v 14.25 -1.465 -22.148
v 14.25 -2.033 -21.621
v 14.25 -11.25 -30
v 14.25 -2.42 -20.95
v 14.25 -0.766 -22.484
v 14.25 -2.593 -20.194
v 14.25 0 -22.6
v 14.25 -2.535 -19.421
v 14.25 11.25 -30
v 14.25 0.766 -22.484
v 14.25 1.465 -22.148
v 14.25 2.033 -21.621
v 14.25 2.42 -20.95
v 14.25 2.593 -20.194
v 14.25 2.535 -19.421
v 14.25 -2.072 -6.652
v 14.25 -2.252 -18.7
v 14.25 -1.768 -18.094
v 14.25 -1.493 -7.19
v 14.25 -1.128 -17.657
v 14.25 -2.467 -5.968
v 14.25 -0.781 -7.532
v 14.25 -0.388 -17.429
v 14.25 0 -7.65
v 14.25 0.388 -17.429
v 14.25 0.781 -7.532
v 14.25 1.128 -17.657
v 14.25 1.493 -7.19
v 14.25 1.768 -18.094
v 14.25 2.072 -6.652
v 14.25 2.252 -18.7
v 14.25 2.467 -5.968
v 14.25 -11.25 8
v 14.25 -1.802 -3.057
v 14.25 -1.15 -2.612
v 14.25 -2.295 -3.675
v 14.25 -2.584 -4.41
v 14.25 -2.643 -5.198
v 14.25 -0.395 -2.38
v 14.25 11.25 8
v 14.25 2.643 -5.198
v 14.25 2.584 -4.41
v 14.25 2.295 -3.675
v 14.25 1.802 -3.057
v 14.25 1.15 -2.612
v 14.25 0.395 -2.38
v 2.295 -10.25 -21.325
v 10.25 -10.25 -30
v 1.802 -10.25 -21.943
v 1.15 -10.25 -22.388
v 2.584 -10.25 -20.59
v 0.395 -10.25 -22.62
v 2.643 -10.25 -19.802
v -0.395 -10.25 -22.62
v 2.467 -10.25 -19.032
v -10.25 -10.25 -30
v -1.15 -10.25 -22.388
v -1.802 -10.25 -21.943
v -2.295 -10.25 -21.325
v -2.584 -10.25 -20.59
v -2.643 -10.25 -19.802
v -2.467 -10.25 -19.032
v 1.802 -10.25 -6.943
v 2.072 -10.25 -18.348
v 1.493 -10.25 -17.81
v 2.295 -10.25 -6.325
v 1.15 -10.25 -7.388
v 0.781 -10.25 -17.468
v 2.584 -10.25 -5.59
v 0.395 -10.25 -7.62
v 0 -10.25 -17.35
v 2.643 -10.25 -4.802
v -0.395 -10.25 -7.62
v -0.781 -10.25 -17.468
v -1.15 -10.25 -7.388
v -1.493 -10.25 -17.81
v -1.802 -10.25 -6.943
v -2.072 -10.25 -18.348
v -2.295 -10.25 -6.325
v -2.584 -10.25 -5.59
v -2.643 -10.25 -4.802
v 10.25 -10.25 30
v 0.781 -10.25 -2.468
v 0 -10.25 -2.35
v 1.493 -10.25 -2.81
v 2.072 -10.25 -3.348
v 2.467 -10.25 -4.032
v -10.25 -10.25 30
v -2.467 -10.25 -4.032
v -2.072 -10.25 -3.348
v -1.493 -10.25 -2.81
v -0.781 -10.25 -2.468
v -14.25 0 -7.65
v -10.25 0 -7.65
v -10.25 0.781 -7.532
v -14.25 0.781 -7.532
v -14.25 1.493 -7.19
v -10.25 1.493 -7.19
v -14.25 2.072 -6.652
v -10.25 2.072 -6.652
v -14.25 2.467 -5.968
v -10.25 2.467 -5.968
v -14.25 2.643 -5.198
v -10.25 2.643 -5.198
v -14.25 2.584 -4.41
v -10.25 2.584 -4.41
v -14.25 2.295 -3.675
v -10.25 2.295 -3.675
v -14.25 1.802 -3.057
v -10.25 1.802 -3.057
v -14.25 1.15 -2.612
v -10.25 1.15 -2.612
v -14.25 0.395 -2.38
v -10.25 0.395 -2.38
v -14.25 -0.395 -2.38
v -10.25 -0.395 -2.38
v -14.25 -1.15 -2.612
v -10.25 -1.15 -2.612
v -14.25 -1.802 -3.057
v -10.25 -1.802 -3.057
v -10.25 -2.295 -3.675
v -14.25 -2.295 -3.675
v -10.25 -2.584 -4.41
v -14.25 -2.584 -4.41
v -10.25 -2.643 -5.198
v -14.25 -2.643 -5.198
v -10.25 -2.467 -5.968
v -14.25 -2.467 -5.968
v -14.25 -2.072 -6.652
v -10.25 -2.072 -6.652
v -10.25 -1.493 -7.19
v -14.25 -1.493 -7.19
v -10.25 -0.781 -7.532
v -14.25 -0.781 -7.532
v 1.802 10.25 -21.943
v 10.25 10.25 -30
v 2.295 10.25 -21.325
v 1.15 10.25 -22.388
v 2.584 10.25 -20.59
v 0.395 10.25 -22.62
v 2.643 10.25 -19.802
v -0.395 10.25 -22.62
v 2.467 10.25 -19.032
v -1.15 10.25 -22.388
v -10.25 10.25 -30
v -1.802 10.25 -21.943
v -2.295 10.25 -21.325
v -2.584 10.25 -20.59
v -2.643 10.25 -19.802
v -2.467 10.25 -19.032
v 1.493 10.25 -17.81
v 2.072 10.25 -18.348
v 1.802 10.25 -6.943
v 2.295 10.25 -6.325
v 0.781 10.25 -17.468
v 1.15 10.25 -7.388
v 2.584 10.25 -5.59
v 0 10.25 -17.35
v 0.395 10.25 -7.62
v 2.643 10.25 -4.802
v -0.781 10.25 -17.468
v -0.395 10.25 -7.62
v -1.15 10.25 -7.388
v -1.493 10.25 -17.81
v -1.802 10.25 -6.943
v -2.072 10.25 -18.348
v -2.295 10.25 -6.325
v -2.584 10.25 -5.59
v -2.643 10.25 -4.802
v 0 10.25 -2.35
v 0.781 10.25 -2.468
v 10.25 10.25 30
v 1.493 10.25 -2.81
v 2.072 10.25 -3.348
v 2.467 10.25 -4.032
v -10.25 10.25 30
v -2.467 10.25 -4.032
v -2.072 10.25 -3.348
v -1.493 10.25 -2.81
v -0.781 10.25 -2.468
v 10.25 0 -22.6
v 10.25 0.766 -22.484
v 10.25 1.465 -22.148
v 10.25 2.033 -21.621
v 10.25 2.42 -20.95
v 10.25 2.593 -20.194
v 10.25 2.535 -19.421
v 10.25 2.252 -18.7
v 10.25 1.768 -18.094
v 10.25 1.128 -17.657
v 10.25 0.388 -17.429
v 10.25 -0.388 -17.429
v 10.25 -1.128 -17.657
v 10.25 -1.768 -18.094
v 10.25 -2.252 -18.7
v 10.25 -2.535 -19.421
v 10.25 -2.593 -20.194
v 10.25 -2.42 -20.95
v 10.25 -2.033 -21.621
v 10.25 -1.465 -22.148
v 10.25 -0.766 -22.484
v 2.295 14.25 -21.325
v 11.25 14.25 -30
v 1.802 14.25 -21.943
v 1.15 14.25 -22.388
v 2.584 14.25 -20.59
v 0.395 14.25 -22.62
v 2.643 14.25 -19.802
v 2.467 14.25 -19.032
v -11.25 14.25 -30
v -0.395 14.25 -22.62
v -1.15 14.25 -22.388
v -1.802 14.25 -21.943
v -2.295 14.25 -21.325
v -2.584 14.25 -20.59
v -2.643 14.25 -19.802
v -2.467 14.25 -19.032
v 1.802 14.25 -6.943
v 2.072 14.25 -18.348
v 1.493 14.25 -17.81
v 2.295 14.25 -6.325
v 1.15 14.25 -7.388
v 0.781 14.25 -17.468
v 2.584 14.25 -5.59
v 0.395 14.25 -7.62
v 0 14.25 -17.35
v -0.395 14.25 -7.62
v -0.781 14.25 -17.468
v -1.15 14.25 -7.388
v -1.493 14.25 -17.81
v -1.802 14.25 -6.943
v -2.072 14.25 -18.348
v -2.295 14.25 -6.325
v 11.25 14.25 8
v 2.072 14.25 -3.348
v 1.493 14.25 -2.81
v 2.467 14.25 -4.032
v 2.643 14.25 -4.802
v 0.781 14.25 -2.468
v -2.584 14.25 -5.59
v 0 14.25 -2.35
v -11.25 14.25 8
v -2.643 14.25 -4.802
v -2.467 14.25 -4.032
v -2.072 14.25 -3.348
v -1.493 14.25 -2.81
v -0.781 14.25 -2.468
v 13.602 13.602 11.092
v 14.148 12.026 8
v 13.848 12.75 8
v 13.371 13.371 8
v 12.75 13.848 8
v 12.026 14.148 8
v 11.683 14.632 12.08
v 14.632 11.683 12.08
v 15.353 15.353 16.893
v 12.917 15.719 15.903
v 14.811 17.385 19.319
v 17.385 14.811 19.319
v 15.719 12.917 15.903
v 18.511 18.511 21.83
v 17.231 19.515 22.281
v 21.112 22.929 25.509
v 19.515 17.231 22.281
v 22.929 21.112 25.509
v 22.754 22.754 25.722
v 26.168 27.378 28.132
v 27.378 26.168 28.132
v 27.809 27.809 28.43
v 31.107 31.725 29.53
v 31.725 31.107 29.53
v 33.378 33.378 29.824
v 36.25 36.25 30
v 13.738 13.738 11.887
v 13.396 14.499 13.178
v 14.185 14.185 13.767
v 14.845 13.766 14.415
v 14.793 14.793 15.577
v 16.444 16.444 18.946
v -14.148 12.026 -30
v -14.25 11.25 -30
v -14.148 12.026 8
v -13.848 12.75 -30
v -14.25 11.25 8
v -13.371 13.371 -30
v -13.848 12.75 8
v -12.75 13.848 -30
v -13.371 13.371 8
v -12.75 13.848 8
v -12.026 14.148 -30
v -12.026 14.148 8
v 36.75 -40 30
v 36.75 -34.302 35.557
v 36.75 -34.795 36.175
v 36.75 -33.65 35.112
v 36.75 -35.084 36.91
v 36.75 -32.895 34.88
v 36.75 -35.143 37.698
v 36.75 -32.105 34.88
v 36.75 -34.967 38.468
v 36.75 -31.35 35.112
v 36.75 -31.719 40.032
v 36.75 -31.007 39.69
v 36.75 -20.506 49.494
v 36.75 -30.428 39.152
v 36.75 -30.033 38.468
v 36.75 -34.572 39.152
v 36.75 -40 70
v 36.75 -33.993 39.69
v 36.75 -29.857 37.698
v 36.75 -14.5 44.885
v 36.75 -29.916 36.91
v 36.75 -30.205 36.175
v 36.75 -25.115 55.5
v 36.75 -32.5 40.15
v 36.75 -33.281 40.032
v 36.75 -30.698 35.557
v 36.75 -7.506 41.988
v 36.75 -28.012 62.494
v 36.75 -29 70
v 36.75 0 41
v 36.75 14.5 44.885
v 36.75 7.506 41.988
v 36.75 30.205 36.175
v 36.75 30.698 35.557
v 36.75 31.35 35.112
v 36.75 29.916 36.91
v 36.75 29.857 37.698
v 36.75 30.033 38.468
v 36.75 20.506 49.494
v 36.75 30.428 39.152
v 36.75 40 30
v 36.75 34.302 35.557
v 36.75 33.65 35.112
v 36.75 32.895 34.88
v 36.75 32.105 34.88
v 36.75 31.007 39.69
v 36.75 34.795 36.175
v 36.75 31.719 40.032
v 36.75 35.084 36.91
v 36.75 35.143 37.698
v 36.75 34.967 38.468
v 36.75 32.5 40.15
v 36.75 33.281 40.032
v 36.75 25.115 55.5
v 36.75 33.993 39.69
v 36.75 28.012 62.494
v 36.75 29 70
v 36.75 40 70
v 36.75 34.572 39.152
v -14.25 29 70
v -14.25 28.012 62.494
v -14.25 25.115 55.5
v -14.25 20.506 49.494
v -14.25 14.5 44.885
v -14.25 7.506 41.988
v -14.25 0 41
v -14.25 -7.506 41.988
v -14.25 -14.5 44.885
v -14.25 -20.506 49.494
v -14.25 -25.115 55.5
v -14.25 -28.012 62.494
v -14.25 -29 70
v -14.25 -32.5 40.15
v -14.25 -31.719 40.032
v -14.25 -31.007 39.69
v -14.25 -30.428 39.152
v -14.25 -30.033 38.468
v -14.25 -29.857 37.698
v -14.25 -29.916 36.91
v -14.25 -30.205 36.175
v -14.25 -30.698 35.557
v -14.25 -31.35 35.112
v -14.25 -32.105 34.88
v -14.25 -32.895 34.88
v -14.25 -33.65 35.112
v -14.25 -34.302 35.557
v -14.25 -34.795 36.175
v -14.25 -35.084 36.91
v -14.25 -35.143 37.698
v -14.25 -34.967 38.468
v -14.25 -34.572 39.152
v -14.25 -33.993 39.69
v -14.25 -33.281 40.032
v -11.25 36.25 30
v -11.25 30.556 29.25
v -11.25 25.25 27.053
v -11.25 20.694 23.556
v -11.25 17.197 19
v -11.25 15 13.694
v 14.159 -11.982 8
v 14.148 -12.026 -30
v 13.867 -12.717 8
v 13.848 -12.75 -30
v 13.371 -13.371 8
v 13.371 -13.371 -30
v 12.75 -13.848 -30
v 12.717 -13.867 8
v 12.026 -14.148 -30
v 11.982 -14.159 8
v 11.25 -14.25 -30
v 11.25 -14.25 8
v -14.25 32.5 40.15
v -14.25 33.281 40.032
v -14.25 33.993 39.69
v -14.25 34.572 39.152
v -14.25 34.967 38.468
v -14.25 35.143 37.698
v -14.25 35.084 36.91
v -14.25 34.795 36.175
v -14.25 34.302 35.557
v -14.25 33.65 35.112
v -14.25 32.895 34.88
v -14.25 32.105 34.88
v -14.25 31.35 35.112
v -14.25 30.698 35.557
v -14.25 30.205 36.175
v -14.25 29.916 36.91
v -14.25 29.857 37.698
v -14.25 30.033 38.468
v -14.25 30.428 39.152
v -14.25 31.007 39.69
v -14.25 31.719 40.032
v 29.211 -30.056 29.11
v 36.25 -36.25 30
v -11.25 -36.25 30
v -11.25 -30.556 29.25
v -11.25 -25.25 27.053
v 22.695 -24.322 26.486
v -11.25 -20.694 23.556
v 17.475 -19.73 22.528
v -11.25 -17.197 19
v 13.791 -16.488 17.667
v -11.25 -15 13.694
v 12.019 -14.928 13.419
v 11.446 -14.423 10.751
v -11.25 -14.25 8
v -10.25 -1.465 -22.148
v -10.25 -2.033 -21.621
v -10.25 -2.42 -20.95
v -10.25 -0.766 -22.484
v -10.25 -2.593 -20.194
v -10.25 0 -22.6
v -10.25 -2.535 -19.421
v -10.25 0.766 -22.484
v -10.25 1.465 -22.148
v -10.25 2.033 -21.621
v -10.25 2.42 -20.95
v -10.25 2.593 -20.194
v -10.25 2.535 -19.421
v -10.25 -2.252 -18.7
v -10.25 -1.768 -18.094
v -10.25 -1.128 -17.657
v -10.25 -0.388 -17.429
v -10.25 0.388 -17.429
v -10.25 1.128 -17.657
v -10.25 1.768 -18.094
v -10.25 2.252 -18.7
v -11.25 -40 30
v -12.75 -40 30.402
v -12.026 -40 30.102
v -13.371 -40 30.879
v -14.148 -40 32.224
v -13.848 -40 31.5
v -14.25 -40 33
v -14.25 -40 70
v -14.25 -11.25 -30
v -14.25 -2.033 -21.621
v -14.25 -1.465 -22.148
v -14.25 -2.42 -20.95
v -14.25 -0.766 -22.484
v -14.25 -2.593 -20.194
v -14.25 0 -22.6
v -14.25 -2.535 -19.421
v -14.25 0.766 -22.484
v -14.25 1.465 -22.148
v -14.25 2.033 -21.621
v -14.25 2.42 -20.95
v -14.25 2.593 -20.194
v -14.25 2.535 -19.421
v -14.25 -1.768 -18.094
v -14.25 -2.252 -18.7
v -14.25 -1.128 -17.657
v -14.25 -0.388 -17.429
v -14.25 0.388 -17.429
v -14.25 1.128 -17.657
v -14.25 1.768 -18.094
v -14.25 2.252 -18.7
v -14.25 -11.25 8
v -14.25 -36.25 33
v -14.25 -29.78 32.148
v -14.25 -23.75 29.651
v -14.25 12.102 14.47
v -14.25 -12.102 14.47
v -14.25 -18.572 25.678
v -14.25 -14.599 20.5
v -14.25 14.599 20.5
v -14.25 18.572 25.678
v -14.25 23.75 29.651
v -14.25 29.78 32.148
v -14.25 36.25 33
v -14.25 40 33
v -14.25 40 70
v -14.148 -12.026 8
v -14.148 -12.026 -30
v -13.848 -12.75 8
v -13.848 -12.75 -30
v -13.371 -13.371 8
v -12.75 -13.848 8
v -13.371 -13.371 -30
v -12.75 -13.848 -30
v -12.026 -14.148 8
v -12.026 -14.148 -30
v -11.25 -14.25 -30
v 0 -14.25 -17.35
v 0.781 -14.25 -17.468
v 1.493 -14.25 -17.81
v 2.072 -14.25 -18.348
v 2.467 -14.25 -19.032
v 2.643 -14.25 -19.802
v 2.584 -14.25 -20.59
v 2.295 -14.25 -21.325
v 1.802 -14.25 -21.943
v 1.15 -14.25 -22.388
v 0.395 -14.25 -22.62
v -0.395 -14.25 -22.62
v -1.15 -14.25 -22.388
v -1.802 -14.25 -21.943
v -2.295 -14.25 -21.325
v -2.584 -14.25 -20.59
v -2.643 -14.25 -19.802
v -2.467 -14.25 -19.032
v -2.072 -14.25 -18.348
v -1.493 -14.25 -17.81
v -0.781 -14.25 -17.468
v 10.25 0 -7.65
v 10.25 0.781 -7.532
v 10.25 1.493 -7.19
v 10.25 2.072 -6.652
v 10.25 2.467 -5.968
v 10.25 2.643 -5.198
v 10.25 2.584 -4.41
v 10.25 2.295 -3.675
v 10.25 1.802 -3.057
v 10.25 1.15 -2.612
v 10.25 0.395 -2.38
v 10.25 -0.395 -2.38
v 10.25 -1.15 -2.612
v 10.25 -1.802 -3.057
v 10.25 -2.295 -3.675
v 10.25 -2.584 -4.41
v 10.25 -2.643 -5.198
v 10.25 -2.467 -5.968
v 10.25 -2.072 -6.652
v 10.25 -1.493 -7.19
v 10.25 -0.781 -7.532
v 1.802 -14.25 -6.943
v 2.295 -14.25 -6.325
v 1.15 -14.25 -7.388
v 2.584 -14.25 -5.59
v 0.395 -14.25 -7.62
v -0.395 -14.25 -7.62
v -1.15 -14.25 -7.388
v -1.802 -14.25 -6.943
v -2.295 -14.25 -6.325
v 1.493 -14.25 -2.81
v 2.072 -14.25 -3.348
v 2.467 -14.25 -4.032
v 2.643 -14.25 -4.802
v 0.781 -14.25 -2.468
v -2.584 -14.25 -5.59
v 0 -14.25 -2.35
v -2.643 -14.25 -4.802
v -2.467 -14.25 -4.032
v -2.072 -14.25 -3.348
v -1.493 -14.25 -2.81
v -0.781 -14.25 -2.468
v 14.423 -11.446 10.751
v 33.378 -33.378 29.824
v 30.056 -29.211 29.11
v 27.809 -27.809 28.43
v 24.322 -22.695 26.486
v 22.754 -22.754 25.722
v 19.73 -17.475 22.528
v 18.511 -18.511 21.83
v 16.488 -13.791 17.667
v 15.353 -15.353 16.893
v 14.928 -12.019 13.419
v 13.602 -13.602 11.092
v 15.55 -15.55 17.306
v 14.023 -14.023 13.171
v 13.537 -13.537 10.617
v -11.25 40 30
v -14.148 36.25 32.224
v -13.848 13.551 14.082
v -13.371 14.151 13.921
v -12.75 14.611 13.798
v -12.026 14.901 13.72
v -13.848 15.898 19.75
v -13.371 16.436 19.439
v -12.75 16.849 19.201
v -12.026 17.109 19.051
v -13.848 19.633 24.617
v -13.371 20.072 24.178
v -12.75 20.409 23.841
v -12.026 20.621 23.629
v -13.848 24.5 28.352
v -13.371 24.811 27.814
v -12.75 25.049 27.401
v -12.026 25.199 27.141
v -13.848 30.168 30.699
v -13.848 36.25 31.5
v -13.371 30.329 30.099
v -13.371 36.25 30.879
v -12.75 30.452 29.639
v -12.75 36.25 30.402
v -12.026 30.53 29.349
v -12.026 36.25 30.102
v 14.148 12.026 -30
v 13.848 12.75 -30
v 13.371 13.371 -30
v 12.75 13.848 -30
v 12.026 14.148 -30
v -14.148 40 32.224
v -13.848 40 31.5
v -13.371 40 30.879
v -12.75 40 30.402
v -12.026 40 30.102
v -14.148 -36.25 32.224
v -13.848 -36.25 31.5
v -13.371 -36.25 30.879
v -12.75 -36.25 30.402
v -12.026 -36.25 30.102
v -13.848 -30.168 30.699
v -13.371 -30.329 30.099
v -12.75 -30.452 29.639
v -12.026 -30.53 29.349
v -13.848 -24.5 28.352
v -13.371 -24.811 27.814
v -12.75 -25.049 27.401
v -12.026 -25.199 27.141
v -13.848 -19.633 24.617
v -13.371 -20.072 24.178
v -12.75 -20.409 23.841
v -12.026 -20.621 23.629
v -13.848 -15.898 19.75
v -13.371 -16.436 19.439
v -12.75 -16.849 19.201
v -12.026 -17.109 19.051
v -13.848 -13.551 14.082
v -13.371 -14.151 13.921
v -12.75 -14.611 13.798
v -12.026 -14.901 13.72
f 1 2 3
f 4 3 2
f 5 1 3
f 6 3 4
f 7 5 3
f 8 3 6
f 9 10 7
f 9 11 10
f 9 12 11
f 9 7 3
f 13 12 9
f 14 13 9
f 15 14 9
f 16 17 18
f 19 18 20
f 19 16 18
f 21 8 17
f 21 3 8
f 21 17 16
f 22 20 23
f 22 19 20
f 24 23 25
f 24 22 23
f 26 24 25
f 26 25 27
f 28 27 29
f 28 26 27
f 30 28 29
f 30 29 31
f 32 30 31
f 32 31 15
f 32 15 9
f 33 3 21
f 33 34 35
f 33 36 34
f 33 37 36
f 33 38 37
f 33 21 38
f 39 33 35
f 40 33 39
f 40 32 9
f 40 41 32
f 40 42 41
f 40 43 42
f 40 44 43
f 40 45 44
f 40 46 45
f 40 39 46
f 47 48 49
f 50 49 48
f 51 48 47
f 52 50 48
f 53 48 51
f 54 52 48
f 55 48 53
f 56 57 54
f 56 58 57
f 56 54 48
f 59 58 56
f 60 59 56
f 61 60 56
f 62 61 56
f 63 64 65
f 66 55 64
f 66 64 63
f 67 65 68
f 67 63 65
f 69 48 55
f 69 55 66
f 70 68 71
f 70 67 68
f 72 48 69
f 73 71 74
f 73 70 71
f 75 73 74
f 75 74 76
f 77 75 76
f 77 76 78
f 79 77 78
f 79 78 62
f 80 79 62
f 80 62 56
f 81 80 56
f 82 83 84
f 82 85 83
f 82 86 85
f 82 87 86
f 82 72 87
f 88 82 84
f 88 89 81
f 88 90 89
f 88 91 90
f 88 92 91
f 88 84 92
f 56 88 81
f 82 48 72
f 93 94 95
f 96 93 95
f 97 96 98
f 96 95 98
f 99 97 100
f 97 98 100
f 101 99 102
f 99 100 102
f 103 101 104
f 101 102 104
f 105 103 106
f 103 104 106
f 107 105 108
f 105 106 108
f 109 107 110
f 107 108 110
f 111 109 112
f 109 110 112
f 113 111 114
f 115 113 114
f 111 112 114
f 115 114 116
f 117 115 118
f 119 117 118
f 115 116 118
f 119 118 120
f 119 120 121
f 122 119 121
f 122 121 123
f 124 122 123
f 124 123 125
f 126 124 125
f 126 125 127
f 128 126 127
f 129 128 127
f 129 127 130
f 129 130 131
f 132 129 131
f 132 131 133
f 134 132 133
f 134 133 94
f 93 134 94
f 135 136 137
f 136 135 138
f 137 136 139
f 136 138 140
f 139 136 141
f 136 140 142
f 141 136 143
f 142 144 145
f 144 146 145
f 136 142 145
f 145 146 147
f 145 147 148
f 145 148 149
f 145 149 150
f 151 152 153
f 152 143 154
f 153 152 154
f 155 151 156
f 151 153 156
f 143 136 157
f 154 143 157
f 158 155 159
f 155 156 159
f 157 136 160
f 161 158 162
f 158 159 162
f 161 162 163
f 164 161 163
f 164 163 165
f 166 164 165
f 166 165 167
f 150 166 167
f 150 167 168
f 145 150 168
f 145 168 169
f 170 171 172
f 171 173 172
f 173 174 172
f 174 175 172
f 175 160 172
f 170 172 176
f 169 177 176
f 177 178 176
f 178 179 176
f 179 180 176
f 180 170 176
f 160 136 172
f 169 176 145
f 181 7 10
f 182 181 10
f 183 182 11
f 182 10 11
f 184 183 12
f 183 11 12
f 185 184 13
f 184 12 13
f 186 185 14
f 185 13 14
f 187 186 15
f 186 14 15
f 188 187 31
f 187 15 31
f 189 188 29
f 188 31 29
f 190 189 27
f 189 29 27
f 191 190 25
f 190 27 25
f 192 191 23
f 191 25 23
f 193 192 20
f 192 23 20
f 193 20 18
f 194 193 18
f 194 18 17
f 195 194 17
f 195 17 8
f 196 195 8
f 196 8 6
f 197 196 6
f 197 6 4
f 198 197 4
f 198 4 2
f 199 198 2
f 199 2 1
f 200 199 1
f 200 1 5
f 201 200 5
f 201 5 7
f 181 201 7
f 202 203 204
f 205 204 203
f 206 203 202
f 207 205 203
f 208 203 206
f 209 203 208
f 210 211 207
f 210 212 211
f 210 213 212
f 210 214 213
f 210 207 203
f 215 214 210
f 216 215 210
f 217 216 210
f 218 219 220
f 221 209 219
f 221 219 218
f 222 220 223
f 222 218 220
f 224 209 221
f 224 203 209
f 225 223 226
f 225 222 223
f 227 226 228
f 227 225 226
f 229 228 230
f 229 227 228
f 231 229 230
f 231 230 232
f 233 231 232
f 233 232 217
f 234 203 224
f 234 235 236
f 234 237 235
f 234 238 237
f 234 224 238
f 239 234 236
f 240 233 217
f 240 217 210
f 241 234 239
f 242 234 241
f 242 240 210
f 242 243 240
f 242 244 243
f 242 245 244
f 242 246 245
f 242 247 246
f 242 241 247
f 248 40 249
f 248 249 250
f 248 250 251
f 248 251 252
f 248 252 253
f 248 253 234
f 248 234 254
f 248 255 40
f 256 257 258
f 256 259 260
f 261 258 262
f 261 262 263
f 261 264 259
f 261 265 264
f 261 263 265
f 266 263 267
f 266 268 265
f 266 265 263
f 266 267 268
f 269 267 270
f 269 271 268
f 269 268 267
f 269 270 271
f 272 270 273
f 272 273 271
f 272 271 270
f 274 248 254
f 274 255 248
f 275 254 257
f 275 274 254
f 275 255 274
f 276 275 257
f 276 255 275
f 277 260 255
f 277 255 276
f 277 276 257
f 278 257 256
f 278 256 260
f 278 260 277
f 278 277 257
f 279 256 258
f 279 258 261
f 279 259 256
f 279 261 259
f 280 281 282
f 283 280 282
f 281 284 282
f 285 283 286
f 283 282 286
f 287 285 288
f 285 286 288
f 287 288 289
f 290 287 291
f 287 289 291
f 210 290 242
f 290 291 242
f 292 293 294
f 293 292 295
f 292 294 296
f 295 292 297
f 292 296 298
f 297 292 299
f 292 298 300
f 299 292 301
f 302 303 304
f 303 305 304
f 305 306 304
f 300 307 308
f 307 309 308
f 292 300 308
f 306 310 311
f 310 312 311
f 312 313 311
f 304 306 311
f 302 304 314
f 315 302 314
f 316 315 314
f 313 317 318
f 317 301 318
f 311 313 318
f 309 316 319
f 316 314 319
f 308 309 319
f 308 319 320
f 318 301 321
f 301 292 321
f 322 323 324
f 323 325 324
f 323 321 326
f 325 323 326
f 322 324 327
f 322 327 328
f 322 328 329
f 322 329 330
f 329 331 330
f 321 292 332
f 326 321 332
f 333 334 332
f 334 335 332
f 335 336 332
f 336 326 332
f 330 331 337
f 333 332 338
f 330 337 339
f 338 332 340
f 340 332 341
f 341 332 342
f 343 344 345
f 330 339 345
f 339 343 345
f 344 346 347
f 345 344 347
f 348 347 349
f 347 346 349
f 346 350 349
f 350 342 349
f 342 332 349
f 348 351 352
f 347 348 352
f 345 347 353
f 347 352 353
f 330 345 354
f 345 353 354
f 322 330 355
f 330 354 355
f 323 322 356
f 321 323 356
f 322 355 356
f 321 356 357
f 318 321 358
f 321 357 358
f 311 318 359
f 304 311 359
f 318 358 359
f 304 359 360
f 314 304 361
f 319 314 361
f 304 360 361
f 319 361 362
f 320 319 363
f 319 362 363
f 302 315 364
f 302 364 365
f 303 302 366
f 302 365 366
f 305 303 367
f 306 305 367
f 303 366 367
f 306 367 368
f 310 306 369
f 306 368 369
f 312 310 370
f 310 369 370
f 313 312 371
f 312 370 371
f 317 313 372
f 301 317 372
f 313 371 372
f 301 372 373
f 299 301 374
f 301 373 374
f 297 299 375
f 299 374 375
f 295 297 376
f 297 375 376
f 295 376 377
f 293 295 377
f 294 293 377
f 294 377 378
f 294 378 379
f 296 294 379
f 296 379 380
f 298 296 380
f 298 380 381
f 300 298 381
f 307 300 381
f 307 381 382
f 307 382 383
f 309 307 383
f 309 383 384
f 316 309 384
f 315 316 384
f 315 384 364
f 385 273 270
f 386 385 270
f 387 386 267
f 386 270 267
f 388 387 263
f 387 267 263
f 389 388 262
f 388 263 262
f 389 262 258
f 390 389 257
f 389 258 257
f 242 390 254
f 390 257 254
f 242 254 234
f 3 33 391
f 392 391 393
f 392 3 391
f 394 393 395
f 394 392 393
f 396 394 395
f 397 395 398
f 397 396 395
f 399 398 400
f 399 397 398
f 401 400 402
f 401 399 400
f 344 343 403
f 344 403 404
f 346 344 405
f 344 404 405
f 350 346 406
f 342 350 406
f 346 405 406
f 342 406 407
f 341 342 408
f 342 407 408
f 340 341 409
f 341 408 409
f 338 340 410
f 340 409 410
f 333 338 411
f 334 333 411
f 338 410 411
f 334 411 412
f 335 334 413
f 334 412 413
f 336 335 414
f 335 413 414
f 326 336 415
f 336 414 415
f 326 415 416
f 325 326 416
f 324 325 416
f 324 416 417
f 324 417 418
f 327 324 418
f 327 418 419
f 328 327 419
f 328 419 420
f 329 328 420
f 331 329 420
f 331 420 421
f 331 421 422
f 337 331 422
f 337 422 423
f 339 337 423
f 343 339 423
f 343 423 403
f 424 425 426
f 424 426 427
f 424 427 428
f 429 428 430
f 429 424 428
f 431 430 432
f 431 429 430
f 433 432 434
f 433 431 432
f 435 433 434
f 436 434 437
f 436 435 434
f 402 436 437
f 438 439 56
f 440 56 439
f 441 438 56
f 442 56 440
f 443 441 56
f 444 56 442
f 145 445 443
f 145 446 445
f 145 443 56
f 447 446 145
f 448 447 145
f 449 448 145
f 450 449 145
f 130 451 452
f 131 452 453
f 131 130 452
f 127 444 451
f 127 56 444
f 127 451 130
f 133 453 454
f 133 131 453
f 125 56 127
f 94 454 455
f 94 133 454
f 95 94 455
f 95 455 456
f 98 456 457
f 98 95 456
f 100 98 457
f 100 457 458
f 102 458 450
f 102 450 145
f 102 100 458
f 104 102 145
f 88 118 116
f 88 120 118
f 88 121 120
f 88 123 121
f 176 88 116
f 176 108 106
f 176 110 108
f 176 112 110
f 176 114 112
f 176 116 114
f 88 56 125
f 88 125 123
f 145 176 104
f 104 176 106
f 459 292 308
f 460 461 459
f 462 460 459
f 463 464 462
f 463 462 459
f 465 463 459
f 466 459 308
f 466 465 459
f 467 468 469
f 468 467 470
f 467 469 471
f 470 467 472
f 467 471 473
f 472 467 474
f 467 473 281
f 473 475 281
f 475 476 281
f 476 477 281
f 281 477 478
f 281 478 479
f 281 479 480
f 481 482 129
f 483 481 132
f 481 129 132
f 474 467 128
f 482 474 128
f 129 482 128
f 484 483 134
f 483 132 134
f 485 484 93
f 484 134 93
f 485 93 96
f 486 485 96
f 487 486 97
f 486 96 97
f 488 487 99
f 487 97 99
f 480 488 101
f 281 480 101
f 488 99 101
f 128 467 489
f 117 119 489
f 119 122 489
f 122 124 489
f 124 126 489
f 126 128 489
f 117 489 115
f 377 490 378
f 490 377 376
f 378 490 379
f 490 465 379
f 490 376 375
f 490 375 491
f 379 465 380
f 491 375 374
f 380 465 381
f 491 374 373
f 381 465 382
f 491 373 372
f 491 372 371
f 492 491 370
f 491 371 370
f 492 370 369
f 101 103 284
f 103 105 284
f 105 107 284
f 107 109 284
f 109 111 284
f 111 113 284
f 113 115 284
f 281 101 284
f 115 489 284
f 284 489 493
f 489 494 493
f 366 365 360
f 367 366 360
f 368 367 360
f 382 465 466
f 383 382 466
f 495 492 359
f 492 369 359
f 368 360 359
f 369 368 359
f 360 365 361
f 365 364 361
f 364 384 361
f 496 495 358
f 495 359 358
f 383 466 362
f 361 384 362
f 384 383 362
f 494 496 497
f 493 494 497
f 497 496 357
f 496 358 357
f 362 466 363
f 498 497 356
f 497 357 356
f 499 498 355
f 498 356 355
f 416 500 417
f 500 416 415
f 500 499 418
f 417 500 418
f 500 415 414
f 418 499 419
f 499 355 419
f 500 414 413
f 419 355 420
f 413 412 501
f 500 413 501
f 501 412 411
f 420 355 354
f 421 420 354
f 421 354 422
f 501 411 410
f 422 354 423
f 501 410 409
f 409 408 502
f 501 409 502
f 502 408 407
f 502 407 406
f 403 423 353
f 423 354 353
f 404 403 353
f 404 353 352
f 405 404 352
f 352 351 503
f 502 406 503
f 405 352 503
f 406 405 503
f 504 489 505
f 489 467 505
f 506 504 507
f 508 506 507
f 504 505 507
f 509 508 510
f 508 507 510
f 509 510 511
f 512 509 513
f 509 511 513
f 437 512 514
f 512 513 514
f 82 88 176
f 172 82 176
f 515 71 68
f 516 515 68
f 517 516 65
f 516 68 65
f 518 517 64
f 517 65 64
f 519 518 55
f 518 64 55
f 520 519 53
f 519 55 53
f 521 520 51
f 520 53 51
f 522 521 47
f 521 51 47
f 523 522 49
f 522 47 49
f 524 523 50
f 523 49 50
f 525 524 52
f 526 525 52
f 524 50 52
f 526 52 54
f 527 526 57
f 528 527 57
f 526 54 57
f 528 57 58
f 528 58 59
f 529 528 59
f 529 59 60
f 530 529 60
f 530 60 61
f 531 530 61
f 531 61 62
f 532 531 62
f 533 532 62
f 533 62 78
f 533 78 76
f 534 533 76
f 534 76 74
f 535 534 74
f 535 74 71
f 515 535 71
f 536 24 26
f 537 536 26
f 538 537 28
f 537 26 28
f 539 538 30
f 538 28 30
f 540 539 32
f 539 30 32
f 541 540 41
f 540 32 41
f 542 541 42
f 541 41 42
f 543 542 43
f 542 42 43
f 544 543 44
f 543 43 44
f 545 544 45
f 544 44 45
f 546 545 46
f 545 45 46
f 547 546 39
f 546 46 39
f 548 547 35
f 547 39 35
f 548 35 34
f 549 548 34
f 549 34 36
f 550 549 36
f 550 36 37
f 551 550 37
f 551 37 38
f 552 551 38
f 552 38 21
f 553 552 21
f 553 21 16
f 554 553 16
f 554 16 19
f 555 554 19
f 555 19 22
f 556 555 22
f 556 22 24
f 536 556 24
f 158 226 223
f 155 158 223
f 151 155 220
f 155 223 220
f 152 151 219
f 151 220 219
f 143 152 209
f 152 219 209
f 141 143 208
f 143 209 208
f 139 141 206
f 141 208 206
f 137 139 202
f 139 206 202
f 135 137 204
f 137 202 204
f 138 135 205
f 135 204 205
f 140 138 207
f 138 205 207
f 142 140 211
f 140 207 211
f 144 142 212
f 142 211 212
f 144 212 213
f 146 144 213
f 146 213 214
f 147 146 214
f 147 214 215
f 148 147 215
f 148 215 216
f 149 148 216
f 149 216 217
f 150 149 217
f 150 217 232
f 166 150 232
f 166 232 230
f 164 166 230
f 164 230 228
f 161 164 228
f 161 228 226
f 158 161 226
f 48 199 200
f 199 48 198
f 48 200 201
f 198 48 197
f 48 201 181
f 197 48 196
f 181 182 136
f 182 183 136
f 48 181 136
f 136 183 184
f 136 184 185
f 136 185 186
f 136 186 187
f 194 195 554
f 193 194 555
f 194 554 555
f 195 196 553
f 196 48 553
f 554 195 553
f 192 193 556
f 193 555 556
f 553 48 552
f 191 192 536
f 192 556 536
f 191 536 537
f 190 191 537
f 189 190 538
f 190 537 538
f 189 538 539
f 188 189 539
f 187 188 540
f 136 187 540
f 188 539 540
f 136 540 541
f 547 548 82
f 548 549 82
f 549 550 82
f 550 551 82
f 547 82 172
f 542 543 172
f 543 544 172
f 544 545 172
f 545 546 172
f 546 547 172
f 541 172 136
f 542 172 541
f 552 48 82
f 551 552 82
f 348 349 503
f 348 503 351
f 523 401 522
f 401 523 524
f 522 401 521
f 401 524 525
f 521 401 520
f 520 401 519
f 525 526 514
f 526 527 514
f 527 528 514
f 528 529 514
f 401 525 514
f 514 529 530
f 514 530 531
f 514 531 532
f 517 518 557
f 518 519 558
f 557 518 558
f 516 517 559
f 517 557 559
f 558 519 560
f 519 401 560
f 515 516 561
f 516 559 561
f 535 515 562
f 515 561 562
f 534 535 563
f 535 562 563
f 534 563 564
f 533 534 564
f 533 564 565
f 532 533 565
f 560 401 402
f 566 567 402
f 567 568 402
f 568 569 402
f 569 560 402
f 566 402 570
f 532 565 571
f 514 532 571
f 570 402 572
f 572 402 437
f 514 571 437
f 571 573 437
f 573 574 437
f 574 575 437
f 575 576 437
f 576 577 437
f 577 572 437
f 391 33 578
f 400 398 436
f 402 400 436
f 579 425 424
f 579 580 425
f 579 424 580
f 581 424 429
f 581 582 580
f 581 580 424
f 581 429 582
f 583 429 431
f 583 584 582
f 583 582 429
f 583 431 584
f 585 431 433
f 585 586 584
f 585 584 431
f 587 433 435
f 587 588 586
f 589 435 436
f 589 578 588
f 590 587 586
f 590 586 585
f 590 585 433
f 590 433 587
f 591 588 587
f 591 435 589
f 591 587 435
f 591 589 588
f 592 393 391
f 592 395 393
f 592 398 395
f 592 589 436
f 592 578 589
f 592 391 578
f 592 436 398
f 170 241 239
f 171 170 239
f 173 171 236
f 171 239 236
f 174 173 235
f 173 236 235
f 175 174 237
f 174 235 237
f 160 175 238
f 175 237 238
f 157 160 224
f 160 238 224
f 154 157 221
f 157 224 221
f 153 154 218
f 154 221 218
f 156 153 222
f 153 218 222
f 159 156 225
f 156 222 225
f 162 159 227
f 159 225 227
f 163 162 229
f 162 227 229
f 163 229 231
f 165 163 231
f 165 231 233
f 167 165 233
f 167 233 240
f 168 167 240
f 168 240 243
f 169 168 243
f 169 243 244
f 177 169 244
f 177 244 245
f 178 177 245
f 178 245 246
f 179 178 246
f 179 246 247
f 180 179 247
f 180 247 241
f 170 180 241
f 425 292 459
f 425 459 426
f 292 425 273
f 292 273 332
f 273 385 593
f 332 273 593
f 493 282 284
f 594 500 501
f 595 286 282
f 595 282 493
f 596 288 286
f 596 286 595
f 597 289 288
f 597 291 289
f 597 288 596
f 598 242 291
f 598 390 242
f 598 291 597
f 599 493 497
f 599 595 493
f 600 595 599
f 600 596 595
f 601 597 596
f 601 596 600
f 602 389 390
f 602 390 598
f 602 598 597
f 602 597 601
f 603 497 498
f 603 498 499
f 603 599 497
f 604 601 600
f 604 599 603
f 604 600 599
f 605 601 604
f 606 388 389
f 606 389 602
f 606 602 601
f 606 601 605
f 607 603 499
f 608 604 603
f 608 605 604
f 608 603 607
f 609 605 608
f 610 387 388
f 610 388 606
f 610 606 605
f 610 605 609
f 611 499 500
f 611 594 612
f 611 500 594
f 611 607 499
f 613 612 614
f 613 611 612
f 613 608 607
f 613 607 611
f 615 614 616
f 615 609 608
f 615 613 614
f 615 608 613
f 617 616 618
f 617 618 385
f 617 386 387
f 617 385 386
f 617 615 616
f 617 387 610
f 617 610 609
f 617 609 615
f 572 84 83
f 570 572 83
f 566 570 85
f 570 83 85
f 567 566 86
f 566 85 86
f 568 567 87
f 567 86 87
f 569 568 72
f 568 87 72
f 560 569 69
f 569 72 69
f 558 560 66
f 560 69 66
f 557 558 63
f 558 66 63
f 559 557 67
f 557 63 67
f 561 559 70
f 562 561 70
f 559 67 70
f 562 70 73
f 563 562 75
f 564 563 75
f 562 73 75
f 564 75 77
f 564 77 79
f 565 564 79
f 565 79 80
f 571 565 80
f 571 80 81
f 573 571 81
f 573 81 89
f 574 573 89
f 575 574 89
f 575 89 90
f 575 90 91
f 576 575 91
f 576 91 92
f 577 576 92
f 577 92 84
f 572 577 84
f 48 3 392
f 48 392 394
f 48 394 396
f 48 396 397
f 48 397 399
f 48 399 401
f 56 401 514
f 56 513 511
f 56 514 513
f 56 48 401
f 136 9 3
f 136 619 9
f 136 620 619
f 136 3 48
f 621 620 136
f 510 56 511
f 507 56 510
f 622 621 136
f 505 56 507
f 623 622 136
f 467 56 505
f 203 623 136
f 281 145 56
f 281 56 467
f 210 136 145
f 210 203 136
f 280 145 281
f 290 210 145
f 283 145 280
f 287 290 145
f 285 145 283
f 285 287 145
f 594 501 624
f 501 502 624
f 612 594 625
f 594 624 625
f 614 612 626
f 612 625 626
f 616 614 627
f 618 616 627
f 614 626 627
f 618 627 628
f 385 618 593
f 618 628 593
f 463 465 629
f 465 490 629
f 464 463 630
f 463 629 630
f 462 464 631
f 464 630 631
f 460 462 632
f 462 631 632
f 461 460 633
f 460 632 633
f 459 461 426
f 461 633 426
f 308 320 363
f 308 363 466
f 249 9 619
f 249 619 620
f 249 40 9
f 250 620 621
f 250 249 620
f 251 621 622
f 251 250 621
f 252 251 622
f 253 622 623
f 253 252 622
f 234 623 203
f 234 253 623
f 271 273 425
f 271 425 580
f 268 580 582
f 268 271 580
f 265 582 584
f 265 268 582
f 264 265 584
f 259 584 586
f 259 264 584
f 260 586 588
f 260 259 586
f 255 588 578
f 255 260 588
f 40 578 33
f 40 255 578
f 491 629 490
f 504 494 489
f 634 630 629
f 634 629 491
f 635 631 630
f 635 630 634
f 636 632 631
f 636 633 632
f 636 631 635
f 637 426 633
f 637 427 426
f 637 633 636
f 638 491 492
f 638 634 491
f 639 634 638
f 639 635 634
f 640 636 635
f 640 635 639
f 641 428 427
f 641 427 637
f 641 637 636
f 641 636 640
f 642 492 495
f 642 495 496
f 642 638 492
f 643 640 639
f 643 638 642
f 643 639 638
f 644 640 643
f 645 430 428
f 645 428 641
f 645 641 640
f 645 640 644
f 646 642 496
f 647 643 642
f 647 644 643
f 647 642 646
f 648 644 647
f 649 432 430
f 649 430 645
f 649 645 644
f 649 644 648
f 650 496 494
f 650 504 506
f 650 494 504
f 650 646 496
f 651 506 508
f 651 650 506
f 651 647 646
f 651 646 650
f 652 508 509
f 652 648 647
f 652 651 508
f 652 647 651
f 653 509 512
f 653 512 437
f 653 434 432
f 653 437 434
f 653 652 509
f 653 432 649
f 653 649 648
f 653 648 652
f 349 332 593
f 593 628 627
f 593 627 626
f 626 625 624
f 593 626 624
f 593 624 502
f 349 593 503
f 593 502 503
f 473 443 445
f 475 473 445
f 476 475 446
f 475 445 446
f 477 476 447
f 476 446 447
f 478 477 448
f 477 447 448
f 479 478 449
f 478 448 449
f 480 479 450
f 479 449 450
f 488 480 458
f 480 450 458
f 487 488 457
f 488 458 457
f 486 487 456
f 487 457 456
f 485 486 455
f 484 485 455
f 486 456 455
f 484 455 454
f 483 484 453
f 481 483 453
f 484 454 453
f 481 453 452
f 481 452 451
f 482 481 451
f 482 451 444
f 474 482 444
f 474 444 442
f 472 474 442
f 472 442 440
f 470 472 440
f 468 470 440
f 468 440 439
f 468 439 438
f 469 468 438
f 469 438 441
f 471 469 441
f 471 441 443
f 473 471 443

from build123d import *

# Parameters (mm, degrees)
SKETCH_1_W          = 28.5
SKETCH_1_H          = 28.5
SKETCH_1_W_2        = 20.5
SKETCH_1_H_2        = 20.5
EXTRUDE_1_DEPTH     = 30
SKETCH_2_W          = 80
SKETCH_2_H          = 80
SKETCH_2_R          = 29
EXTRUDE_2_DEPTH     = 51
FILLET_1_R          = 22
CUT_EXTRUDE_1_DEPTH = 51
SKETCH_5_W          = 28.5
SKETCH_5_H          = 28.5
SKETCH_5_W_2        = 20.5
SKETCH_5_H_2        = 20.5
EXTRUDE_3_DEPTH     = 30
SKETCH_6_R          = 2.6
SKETCH_6_R_2        = 2.65
CUT_EXTRUDE_2_DEPTH = 30
SKETCH_7_R          = 2.65
CUT_EXTRUDE_3_DEPTH = 30
SKETCH_8_R          = 2.65
CUT_EXTRUDE_4_DEPTH = 96.399161422
FILLET_3_R          = 3


with BuildPart() as part:
    # 草图1 → 凸台-拉伸1 (new body)
    with BuildSketch(Plane.XY):
        Rectangle(SKETCH_1_W, SKETCH_1_H)
        Rectangle(SKETCH_1_W_2, SKETCH_1_H_2, mode=Mode.SUBTRACT)
    extrude(amount=EXTRUDE_1_DEPTH)

    # 草图2 → 凸台-拉伸2 (add)
    with BuildSketch(Plane.ZY.offset(14.25)):
        with Locations((70, 0)):
            Rectangle(SKETCH_2_W, SKETCH_2_H)
        with Locations((70, 0)):
            Circle(SKETCH_2_R, mode=Mode.SUBTRACT)
    extrude(amount=-EXTRUDE_2_DEPTH)

    # 圆角1
    fillet_1_edges = [part.edges().sort_by_distance(p)[0] for p in [
        (14.25, 0, 30),
        (0, 14.25, 30),
        (0, -14.25, 30),
    ]]
    fillet(fillet_1_edges, radius=FILLET_1_R)

    # 草图3 → 切除-拉伸1 (cut)
    with BuildSketch(Plane.ZY.offset(14.25)):
        with BuildLine():
            Line((70, -29), (70, -40))
            Line((70, -40), (110, -40))
            Line((110, -40), (110, 40))
            Line((110, 40), (70, 40))
            Line((70, 40), (70, 29))
            ThreePointArc((70, 29), (90.506096654, 20.506096654), (99, 0))
            ThreePointArc((99, 0), (90.506096654, -20.506096654), (70, -29))
        make_face()
    extrude(amount=-CUT_EXTRUDE_1_DEPTH, mode=Mode.SUBTRACT)

    # 草图5 → 凸台-拉伸3 (add)
    with BuildSketch(Plane(origin=(0, 0, 0), x_dir=(-1, 0, 0), z_dir=(0, 0, -1))):
        Rectangle(SKETCH_5_W, SKETCH_5_H)
        Rectangle(SKETCH_5_W_2, SKETCH_5_H_2, mode=Mode.SUBTRACT)
    extrude(amount=EXTRUDE_3_DEPTH)

    # 草图6 → 切除-拉伸2 (cut)
    with BuildSketch(Plane(origin=(14.25, 0, 0), x_dir=(0, 0, -1), z_dir=(1, 0, 0))):
        with Locations((20, 0)):
            Circle(SKETCH_6_R)
        with Locations((5, 0)):
            Circle(SKETCH_6_R_2)
    extrude(amount=-CUT_EXTRUDE_2_DEPTH, mode=Mode.SUBTRACT)

    # 草图7 → 切除-拉伸3 (cut)
    with BuildSketch(Plane(origin=(0, 14.25, 0), x_dir=(1, 0, 0), z_dir=(0, 1, 0))):
        with Locations(Location((0, 20, 0), (0, 0, 270))):
            Circle(SKETCH_7_R)
        with Locations(Location((0, 5, 0), (0, 0, 270))):
            Circle(SKETCH_7_R)
    extrude(amount=-CUT_EXTRUDE_3_DEPTH, mode=Mode.SUBTRACT)

    # 草图8 → 切除-拉伸4 (cut, through all)
    with BuildSketch(Plane.ZY.offset(14.25)):
        with Locations((37.5, 32.5)):
            Circle(SKETCH_8_R)
        with Locations((37.5, -32.5)):
            Circle(SKETCH_8_R)
    extrude(amount=-CUT_EXTRUDE_4_DEPTH, mode=Mode.SUBTRACT)

    # 圆角3
    fillet_3_edges = [part.edges().sort_by_distance(p)[0] for p in [
        (-14.25, -38.125, 30),
        (-14.25, 38.125, 30),
        (14.25, -14.25, -11),
        (-14.25, -14.25, -11),
        (14.25, 14.25, -11),
        (-14.25, 14.25, -11),
        (-14.25, -20.693650814, 23.556349186),
        (-14.25, 20.693650814, 23.556349186),
        (22.036924037, 22.036924037, 24.792512369),
        (22.036924037, -22.036924037, 24.792512369),
    ]]
    fillet(fillet_3_edges, radius=FILLET_3_R)


solid = part.part
